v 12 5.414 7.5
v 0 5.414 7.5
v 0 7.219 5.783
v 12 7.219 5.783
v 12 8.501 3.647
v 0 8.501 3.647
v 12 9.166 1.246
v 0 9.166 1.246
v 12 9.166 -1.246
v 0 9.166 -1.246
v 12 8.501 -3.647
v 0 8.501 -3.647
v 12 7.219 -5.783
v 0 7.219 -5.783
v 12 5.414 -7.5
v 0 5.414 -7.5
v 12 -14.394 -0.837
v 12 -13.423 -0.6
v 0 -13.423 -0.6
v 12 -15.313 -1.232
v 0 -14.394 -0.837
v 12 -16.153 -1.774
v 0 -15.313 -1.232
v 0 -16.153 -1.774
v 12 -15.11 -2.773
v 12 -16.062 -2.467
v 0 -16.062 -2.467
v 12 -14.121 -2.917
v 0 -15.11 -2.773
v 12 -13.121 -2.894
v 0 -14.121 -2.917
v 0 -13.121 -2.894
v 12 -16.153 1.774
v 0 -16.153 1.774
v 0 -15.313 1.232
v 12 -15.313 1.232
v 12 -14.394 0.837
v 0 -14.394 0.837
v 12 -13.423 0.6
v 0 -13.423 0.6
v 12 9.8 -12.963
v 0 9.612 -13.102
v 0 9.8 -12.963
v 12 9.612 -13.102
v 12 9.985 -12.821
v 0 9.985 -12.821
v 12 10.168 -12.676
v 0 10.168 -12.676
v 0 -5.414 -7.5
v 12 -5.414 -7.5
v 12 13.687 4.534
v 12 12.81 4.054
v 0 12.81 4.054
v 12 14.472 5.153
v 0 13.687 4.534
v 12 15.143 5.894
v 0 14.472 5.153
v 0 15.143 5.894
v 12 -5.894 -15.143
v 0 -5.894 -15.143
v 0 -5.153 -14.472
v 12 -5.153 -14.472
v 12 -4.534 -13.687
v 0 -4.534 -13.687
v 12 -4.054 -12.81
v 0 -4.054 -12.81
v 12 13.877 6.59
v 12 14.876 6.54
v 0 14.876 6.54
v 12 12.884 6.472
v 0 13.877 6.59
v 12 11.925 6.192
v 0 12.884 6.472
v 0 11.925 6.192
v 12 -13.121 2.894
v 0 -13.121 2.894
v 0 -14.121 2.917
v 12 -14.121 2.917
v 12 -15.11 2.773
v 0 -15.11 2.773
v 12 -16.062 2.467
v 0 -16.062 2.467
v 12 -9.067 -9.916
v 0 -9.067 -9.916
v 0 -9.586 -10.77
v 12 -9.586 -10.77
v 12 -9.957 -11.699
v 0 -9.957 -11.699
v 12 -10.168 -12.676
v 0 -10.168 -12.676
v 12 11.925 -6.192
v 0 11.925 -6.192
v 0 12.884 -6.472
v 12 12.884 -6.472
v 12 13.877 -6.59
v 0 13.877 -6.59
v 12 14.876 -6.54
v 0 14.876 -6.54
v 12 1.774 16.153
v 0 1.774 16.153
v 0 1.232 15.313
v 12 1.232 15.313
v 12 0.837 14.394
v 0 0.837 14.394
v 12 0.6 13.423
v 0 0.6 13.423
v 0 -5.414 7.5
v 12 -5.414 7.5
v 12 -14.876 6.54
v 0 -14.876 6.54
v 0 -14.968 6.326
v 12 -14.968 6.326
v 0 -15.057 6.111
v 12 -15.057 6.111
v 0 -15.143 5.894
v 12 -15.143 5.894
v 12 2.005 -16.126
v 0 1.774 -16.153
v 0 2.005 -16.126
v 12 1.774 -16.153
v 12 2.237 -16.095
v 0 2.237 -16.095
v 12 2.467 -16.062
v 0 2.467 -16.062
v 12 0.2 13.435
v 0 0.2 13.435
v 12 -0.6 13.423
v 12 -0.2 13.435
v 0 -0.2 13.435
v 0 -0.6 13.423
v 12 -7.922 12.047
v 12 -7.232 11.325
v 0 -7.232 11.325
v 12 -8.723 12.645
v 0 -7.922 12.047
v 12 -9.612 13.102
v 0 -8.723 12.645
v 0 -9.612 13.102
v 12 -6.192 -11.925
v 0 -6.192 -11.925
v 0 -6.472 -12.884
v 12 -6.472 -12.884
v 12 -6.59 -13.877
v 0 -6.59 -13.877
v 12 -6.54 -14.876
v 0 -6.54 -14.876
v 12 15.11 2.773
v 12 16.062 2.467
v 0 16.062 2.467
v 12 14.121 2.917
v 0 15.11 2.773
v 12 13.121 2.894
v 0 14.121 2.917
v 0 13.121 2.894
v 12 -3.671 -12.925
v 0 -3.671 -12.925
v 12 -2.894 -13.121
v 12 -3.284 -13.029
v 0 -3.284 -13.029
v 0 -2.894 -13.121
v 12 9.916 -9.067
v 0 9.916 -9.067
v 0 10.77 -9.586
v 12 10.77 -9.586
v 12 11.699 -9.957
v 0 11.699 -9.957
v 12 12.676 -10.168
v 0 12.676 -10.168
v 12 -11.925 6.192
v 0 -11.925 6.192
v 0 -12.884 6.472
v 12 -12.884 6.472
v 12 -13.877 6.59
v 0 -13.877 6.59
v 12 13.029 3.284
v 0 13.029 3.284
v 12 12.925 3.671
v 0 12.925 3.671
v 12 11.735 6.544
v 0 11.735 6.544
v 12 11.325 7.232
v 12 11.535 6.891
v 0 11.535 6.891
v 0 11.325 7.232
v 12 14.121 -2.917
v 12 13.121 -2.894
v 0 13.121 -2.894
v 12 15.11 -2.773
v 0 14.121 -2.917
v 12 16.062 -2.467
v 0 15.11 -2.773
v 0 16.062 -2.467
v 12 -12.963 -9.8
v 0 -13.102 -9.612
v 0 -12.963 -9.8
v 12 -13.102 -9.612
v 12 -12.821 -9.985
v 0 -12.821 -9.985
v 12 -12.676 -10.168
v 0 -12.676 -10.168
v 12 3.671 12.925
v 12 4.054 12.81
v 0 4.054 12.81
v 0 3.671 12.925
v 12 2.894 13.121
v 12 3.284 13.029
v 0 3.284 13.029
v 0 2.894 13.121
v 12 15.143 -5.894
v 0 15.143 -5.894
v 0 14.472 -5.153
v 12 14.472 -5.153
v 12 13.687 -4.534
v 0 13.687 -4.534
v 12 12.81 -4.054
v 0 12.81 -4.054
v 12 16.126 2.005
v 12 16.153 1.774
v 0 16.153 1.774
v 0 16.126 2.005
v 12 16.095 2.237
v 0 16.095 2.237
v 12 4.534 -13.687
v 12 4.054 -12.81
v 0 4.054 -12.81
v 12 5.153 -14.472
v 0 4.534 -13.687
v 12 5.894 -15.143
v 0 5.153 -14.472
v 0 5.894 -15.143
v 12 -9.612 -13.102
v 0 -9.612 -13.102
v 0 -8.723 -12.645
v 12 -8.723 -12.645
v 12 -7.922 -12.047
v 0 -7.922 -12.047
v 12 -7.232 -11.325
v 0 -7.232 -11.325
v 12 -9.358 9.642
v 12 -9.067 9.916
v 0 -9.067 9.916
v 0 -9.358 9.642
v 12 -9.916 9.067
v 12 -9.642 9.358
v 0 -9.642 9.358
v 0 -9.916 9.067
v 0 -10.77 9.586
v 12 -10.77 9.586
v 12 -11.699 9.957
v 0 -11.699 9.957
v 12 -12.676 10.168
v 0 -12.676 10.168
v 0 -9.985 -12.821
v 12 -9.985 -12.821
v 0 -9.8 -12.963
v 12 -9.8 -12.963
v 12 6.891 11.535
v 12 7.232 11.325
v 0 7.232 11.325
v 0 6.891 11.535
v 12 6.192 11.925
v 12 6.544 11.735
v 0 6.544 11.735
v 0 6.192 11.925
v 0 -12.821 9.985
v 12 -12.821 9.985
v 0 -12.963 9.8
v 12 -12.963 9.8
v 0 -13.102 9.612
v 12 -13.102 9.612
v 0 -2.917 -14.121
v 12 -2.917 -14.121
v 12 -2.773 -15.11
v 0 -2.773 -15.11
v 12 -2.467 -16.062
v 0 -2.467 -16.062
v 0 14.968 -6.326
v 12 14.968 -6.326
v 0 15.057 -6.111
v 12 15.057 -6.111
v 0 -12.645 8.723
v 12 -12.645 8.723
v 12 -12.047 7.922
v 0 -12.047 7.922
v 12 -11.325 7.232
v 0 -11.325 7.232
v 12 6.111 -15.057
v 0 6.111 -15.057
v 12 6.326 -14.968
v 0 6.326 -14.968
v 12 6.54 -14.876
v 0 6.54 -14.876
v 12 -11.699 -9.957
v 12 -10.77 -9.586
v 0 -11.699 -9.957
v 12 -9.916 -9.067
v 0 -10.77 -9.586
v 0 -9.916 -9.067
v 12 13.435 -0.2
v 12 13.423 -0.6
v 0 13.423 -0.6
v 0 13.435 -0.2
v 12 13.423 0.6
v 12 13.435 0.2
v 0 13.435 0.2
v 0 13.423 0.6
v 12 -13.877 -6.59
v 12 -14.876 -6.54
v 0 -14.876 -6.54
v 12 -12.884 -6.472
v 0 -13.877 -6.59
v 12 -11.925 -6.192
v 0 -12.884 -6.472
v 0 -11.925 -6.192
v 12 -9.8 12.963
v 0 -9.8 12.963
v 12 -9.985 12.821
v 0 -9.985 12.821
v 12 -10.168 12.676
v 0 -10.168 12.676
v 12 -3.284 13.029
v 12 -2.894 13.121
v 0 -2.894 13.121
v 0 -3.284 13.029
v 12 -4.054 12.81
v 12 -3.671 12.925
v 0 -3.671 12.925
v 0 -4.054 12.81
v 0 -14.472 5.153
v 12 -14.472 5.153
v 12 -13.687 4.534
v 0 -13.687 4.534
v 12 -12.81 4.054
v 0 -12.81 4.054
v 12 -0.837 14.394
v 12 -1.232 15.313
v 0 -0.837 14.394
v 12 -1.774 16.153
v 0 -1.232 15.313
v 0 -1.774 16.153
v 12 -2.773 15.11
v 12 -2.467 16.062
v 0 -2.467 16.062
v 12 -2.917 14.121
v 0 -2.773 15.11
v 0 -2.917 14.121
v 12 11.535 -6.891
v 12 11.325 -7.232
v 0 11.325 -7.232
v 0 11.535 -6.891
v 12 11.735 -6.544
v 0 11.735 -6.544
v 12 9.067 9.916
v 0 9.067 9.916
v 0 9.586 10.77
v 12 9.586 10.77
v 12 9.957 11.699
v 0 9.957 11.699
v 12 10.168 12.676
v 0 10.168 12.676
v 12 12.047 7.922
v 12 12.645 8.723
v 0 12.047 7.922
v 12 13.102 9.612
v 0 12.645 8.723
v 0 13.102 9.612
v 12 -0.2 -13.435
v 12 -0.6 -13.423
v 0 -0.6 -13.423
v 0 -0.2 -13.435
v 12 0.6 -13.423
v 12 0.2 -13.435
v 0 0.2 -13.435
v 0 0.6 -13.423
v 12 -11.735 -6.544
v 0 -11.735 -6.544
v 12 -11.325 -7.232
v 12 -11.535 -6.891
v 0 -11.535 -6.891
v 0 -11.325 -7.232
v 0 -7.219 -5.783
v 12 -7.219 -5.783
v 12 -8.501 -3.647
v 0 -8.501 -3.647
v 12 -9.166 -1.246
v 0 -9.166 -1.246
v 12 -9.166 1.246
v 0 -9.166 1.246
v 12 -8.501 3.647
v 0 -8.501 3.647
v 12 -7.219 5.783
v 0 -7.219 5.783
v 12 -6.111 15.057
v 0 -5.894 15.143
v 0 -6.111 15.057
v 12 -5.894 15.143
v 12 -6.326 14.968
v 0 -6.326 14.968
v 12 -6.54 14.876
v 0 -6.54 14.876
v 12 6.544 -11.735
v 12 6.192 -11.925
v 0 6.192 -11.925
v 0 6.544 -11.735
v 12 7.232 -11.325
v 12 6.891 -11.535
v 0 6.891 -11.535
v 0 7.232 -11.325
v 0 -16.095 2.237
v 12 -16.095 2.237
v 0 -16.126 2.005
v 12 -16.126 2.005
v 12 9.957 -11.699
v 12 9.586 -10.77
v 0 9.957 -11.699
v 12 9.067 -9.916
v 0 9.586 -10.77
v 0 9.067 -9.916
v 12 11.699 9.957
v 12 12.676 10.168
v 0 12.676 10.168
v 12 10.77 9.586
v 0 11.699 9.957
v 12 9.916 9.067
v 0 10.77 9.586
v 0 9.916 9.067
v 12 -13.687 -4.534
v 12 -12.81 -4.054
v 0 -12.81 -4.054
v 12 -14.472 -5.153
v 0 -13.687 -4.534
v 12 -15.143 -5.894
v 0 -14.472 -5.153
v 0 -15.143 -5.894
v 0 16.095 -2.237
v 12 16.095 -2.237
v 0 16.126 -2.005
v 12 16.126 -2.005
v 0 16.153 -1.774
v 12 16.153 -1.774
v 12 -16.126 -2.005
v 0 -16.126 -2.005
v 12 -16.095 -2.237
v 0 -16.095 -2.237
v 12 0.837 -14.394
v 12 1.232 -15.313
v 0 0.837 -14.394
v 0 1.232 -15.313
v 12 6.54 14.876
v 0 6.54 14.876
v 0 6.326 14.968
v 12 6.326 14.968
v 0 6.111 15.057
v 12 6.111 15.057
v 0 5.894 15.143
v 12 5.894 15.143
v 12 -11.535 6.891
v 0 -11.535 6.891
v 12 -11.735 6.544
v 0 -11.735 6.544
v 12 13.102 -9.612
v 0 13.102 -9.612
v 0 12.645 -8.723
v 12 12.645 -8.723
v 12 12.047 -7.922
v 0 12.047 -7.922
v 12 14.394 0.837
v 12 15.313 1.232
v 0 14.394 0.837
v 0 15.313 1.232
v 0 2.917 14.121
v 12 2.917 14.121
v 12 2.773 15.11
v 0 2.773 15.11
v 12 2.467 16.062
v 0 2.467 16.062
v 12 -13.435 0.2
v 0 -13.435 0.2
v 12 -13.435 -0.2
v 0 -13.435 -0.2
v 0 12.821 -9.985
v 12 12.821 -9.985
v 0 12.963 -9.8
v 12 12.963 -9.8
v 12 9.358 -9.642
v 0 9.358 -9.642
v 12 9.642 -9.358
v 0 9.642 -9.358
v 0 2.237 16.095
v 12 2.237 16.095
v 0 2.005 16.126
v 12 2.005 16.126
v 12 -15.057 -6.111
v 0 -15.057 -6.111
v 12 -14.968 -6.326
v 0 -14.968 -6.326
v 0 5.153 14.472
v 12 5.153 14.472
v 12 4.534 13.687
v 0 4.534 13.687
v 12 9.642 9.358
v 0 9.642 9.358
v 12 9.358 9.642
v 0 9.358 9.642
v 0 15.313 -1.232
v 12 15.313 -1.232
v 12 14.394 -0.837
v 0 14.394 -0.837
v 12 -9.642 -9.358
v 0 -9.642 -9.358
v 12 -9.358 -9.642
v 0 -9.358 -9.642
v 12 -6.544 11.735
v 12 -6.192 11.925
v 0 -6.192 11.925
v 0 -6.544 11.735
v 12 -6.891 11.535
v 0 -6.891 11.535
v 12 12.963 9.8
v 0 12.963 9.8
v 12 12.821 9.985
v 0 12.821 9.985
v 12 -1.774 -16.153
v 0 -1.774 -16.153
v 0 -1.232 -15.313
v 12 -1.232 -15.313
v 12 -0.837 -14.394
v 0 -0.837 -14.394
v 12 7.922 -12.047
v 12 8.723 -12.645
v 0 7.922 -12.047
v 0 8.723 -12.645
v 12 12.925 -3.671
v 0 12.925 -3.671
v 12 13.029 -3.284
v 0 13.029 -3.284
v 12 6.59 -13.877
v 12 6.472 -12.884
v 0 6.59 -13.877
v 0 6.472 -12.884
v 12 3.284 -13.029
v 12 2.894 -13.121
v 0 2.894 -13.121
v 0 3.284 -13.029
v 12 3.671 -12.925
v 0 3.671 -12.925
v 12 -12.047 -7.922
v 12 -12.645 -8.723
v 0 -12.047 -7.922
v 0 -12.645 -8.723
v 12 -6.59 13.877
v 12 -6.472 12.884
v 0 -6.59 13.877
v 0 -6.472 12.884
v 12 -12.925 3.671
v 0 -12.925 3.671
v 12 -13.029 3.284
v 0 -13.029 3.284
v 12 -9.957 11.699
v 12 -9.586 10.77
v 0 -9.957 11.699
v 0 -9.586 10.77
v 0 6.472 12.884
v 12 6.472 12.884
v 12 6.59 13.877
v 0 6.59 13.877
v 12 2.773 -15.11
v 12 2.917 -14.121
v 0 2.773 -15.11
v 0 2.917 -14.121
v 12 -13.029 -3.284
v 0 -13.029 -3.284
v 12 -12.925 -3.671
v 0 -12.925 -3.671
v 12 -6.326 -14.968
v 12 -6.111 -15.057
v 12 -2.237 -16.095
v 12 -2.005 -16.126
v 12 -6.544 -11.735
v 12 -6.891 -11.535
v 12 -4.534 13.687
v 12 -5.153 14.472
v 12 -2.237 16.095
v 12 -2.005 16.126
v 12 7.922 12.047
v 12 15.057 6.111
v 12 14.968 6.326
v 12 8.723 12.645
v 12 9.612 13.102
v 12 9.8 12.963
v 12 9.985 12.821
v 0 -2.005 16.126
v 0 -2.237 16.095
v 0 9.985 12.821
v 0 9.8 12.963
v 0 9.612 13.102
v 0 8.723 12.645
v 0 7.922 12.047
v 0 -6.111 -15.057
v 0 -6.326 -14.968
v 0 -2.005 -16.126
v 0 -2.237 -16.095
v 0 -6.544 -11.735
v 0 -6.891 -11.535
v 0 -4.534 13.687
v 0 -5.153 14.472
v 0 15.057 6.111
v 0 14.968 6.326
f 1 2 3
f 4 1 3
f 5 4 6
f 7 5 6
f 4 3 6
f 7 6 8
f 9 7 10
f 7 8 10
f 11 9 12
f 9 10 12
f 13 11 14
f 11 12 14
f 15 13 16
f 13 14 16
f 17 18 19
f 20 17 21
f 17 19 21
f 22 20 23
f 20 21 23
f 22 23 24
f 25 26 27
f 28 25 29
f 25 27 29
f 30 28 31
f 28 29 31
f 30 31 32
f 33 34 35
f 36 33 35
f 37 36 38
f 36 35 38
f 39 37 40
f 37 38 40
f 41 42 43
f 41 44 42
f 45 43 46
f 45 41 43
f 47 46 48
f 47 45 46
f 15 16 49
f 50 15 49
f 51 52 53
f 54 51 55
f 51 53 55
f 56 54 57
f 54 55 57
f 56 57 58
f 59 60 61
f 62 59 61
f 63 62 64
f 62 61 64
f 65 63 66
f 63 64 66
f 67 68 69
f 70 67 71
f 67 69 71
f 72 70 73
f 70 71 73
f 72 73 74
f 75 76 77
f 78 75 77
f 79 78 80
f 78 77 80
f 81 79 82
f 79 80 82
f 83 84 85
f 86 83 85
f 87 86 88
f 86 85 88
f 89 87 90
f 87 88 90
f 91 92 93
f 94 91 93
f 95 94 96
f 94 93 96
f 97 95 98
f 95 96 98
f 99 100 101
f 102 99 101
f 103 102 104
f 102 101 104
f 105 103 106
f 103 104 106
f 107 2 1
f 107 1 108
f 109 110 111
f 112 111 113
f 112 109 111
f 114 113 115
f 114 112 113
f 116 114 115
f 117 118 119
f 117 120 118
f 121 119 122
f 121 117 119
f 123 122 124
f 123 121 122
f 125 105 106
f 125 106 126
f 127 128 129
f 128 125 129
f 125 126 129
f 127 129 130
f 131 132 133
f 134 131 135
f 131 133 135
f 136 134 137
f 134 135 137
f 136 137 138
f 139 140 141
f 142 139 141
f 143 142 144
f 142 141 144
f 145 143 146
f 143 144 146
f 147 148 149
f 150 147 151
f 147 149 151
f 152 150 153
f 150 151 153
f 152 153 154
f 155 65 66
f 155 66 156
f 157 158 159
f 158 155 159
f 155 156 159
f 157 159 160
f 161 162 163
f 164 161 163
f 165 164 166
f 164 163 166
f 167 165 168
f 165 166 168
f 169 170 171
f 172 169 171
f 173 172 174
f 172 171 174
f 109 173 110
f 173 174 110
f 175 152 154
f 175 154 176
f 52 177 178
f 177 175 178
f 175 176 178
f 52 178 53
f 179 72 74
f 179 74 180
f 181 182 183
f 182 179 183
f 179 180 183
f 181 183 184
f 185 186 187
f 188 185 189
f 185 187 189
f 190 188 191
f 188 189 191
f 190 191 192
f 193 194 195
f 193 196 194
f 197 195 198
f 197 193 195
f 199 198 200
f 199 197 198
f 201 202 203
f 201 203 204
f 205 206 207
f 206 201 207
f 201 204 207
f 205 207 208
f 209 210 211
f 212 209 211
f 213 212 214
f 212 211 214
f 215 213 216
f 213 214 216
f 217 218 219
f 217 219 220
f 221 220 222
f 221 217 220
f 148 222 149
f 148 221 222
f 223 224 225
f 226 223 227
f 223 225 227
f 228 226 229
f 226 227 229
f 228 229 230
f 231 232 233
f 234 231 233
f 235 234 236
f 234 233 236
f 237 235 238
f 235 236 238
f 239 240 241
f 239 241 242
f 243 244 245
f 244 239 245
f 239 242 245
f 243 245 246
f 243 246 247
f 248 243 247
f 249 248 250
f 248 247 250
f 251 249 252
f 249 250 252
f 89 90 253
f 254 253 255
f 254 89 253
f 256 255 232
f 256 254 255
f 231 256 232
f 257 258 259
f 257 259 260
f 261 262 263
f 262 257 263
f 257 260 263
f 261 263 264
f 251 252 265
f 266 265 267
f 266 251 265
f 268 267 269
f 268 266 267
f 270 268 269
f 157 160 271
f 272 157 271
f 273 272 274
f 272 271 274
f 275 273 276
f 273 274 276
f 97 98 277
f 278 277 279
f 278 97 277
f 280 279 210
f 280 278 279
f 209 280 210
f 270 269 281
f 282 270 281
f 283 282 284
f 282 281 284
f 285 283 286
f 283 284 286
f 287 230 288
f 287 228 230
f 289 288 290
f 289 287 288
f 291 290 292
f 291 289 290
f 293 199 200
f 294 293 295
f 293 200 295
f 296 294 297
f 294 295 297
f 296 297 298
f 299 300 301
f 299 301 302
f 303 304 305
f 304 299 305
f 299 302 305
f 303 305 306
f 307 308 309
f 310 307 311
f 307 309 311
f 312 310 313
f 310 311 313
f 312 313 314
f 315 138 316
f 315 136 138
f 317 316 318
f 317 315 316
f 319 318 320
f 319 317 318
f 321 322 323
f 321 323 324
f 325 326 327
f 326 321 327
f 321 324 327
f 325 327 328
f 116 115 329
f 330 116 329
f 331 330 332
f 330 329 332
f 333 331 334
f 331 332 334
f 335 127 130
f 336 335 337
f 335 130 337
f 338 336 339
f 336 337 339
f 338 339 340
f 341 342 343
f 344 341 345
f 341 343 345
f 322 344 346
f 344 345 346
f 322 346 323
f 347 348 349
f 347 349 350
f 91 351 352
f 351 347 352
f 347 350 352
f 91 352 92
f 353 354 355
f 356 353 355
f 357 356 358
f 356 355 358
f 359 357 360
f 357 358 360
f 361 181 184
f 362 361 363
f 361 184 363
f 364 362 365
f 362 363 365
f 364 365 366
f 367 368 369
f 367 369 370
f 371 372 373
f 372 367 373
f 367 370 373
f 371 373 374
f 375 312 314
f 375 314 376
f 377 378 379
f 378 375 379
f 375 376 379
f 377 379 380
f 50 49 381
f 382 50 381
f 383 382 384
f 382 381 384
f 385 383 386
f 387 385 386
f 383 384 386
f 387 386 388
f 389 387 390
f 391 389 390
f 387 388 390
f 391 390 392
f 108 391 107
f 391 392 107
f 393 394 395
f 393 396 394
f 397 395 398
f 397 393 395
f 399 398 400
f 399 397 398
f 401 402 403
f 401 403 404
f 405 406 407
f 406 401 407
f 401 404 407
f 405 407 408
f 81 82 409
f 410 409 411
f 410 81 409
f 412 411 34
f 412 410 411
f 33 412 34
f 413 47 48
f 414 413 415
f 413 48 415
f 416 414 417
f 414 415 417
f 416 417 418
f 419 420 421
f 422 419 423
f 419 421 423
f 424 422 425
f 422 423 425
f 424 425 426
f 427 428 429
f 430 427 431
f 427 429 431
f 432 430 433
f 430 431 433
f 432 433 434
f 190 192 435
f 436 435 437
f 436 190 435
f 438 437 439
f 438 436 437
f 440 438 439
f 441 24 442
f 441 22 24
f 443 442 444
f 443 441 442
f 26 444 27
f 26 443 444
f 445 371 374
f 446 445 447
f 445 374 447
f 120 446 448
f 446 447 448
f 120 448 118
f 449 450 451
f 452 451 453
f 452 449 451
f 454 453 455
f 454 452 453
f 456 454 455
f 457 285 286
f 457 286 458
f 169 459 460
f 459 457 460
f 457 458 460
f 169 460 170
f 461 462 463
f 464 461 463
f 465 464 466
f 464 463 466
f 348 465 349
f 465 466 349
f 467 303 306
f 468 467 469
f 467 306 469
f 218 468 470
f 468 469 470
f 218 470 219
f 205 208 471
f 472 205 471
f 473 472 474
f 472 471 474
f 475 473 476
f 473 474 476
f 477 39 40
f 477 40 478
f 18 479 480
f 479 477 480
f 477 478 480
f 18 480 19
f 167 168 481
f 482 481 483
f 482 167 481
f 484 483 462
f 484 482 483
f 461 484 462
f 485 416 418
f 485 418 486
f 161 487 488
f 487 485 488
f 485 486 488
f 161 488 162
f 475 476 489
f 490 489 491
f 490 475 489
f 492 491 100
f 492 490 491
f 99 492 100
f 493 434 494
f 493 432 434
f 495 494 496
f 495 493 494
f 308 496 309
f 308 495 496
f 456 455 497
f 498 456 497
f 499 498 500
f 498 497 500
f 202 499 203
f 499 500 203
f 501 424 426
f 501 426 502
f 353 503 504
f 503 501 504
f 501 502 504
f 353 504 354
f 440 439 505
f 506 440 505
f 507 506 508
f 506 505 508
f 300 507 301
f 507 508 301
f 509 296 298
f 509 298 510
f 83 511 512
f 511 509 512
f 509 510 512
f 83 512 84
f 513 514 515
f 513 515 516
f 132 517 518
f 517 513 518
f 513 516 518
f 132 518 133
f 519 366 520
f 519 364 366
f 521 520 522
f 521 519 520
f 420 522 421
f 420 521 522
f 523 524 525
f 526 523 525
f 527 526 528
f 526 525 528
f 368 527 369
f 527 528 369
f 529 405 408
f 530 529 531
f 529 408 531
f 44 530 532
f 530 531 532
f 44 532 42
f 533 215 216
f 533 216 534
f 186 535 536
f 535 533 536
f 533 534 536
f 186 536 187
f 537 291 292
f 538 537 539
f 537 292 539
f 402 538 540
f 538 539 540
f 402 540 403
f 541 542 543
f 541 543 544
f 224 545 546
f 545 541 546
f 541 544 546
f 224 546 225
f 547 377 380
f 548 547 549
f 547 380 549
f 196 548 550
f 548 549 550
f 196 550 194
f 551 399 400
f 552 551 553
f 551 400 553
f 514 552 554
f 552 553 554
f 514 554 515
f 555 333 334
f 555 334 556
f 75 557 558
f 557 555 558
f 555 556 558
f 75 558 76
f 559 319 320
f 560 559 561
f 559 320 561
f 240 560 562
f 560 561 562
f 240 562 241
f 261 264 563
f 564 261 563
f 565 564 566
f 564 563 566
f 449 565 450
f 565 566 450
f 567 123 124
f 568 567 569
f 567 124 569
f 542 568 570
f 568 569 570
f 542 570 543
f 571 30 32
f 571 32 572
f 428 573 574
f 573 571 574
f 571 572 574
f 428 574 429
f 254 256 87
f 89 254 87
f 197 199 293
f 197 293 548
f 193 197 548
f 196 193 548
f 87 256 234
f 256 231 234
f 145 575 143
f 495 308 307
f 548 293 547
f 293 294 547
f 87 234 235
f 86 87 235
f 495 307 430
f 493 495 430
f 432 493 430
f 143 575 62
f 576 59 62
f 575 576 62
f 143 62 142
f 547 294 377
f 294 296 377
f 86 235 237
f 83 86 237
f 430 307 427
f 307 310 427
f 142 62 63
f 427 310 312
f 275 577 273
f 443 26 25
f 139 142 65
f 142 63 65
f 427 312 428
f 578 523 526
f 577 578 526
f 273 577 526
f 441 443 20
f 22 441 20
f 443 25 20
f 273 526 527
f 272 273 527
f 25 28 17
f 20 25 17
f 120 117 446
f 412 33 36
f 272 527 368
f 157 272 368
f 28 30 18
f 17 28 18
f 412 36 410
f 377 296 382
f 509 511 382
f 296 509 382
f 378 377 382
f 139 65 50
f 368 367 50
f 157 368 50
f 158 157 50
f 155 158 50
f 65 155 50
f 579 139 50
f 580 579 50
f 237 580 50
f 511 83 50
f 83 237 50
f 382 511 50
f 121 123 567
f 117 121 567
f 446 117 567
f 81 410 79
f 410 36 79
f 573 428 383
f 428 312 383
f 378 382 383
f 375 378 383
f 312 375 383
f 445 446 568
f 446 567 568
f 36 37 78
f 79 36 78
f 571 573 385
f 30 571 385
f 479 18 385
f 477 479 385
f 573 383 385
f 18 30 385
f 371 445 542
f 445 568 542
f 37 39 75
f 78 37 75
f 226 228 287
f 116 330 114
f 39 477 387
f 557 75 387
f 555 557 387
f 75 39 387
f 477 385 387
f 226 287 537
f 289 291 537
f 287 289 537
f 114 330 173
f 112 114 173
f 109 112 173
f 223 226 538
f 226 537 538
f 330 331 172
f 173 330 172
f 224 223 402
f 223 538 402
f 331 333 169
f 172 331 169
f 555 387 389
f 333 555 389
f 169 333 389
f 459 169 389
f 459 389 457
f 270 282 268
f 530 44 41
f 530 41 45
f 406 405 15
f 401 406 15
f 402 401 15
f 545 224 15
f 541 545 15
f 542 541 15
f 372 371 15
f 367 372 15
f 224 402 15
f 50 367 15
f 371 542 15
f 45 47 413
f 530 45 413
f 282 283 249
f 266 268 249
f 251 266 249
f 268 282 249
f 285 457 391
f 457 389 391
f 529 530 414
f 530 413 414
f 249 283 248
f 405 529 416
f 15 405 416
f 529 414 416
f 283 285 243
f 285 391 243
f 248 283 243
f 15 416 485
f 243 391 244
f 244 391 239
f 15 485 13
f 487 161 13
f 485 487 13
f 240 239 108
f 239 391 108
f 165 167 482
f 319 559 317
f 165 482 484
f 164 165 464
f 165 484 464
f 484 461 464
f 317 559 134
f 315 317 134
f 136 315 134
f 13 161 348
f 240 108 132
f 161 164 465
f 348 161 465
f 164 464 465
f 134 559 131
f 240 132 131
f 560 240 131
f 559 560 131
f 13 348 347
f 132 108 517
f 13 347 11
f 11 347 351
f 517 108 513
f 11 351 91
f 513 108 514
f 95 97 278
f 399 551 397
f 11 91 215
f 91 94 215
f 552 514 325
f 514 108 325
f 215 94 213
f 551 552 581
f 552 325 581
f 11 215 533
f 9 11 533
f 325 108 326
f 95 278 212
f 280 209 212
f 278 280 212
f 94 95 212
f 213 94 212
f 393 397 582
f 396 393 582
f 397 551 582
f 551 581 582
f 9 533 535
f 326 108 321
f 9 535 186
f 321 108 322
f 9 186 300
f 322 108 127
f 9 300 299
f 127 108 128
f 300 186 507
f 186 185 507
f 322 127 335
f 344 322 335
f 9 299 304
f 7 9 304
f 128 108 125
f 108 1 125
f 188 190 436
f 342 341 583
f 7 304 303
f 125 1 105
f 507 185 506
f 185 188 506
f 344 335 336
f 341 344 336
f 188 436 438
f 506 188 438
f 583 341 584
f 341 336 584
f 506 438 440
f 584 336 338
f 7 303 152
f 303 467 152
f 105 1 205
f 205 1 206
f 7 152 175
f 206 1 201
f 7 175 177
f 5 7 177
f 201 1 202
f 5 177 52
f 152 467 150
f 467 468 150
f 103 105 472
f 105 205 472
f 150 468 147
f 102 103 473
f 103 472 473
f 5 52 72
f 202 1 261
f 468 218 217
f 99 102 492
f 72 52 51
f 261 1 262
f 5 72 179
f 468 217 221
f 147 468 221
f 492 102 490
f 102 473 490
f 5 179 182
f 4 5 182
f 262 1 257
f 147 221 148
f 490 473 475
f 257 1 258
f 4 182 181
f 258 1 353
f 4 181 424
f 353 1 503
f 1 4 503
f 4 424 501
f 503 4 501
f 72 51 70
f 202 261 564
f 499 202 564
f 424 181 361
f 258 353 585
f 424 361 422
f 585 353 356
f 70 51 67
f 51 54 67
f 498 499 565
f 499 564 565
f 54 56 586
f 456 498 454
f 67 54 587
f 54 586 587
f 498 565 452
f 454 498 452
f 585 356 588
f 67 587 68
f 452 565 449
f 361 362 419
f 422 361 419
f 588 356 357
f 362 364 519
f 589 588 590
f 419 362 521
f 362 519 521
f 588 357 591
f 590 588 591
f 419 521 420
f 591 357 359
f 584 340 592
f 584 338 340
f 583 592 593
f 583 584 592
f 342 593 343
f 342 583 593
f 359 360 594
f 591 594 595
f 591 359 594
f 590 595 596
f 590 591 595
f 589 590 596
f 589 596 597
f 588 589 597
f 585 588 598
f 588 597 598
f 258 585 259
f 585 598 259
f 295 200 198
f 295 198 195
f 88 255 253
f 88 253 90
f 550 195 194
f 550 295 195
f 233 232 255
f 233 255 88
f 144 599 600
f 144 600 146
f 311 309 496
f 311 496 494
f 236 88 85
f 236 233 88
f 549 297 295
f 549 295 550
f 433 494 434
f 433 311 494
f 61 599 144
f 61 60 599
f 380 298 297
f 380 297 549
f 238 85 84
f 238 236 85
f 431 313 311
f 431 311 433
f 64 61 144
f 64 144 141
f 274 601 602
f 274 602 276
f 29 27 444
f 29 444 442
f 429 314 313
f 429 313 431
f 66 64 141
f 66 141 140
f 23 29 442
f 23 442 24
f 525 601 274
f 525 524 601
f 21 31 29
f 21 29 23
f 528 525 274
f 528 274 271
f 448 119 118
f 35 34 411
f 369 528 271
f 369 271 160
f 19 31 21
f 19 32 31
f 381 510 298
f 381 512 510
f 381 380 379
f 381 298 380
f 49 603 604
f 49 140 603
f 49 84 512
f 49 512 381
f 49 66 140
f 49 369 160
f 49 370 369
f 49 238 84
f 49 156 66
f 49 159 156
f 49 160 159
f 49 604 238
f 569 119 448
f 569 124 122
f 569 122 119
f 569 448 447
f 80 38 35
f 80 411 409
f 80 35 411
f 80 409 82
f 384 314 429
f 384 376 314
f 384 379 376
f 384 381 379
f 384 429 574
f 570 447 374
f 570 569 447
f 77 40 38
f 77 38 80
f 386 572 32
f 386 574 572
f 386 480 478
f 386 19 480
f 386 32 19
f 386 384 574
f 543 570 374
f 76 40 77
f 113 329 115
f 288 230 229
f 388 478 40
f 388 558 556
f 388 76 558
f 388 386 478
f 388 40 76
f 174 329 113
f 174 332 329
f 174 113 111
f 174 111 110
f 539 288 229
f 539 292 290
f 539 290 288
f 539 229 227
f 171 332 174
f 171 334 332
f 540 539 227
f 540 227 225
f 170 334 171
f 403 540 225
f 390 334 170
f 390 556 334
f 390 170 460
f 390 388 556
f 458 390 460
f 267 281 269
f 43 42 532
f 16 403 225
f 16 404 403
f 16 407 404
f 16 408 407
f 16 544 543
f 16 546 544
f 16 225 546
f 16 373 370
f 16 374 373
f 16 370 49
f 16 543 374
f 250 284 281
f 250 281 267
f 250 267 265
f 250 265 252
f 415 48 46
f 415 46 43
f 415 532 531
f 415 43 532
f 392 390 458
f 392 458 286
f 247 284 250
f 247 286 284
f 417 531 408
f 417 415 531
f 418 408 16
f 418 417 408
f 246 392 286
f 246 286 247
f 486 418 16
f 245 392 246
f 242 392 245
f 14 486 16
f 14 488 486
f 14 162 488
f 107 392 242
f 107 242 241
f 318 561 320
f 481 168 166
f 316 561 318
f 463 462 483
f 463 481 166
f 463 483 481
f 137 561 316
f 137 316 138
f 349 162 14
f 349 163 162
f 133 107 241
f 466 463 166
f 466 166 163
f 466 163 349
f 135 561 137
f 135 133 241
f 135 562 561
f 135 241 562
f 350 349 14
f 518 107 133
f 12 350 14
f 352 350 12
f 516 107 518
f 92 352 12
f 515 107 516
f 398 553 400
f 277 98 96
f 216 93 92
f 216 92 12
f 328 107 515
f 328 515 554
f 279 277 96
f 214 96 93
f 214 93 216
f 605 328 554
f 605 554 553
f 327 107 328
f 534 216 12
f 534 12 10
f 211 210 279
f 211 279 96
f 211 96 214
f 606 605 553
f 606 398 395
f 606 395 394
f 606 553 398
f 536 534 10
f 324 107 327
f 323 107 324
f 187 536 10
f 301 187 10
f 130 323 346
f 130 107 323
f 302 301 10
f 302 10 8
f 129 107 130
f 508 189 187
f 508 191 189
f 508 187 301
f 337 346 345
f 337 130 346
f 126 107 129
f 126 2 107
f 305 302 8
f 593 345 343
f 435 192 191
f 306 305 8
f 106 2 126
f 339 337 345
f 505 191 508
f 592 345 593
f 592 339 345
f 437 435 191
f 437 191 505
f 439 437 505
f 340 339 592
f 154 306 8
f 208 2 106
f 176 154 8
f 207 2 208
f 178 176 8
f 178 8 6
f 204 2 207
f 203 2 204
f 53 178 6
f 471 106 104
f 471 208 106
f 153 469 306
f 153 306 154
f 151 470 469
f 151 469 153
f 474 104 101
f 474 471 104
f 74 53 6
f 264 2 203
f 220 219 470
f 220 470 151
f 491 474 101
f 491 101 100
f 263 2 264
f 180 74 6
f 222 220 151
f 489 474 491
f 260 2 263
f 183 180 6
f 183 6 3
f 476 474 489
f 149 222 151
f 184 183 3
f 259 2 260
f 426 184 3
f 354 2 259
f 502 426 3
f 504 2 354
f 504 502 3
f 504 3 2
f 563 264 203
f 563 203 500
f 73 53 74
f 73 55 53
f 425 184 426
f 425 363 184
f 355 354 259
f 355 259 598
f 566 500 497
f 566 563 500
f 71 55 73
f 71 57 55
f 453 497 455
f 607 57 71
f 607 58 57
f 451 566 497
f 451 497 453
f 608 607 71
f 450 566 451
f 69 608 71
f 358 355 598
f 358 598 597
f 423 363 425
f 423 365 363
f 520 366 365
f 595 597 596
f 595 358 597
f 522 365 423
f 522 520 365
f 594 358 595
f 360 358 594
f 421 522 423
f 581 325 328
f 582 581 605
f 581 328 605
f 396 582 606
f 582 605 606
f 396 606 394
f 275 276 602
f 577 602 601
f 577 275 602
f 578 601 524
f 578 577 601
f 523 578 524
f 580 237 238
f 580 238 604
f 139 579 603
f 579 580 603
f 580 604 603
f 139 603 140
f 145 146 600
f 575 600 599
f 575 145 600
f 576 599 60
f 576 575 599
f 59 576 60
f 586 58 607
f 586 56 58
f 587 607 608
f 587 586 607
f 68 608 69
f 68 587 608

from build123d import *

# Parameters (mm, degrees)
BASPROSKE_W     = 12
BASPROSKE_H     = 16.25
TOOTHCUT_DEPTH  = 26.925373671
TEETHCUTS_COUNT = 24
TEETHCUTS_ANGLE = 345
BORSKE_R        = 12
BORE_DEPTH      = 50.0000508
SKETCH_1_R      = 12
SKETCH_1_R_2    = 9.25
EXTRUDE_1_DEPTH = 12
EXTRUDE_2_DEPTH = 12


with BuildPart() as part:
    # BasProSke → Base-Revolve (revolve)
    with BuildSketch(Plane(origin=(0, 0, 0), x_dir=(1, 0, 0), z_dir=(0, 1, 0)), mode=Mode.PRIVATE) as base_revolve_sk:
        with Locations((6, 8.125)):
            Rectangle(BASPROSKE_W, BASPROSKE_H)
    revolve(base_revolve_sk.sketch.rotate(Axis((-10, 0, 0), (1, 0, 0)), 180), axis=Axis((-10, 0, 0), (1, 0, 0)))

    # TooCutSke → ToothCut (cut, through all)
    with BuildSketch(Plane(origin=(0, 0, 0), x_dir=(0, 0, -1), z_dir=(1, 0, 0))):
        with BuildLine():
            ThreePointArc((0.600427448, 13.423077856), (0, 13.4365), (-0.600427448, 13.423077856))
            ThreePointArc((-0.600427448, 13.423077856), (-1.021266982, 14.875437681), (-1.791844283, 16.176462507))
            ThreePointArc((-1.791844283, 16.176462507), (0, 16.2754), (1.791844283, 16.176462507))
            ThreePointArc((1.791844283, 16.176462507), (1.021266982, 14.875437681), (0.600427448, 13.423077856))
        make_face()
    toothcut = extrude(amount=TOOTHCUT_DEPTH, mode=Mode.SUBTRACT)

    # TeethCuts: ToothCut ×24 about axis
    teethcuts_axis = Axis((-10, 0, 0), (1, 0, 0))
    for i in range(1, TEETHCUTS_COUNT):
        add(toothcut.rotate(teethcuts_axis, i * TEETHCUTS_ANGLE / (TEETHCUTS_COUNT - 1)), mode=Mode.SUBTRACT)

    # BorSke → Bore (cut, symmetric)
    with BuildSketch(Plane(origin=(0, 0, 0), x_dir=(0, 0, -1), z_dir=(1, 0, 0))):
        with Locations(Location((0, 0, 0), (0, 0, 180))):
            Circle(BORSKE_R)
    extrude(amount=BORE_DEPTH, both=True, mode=Mode.SUBTRACT)

    # 草图1 → 凸台-拉伸1 (add, through all)
    with BuildSketch(Plane.ZY):
        Circle(SKETCH_1_R)
        Circle(SKETCH_1_R_2, mode=Mode.SUBTRACT)
    extrude(amount=-EXTRUDE_1_DEPTH)

    # 草图2 → 凸台-拉伸2 (add, through all)
    with BuildSketch(Plane.ZY):
        with BuildLine():
            Line((-7.5, 5.414101957), (-7.5, -5.414101957))
            ThreePointArc((-7.5, -5.414101957), (-9.25, 0), (-7.5, 5.414101957))
        make_face()
        with BuildLine():
            Line((7.5, 5.414101957), (7.5, -5.414101957))
            ThreePointArc((7.5, -5.414101957), (9.25, 0), (7.5, 5.414101957))
        make_face()
    extrude(amount=-EXTRUDE_2_DEPTH)


solid = part.part
